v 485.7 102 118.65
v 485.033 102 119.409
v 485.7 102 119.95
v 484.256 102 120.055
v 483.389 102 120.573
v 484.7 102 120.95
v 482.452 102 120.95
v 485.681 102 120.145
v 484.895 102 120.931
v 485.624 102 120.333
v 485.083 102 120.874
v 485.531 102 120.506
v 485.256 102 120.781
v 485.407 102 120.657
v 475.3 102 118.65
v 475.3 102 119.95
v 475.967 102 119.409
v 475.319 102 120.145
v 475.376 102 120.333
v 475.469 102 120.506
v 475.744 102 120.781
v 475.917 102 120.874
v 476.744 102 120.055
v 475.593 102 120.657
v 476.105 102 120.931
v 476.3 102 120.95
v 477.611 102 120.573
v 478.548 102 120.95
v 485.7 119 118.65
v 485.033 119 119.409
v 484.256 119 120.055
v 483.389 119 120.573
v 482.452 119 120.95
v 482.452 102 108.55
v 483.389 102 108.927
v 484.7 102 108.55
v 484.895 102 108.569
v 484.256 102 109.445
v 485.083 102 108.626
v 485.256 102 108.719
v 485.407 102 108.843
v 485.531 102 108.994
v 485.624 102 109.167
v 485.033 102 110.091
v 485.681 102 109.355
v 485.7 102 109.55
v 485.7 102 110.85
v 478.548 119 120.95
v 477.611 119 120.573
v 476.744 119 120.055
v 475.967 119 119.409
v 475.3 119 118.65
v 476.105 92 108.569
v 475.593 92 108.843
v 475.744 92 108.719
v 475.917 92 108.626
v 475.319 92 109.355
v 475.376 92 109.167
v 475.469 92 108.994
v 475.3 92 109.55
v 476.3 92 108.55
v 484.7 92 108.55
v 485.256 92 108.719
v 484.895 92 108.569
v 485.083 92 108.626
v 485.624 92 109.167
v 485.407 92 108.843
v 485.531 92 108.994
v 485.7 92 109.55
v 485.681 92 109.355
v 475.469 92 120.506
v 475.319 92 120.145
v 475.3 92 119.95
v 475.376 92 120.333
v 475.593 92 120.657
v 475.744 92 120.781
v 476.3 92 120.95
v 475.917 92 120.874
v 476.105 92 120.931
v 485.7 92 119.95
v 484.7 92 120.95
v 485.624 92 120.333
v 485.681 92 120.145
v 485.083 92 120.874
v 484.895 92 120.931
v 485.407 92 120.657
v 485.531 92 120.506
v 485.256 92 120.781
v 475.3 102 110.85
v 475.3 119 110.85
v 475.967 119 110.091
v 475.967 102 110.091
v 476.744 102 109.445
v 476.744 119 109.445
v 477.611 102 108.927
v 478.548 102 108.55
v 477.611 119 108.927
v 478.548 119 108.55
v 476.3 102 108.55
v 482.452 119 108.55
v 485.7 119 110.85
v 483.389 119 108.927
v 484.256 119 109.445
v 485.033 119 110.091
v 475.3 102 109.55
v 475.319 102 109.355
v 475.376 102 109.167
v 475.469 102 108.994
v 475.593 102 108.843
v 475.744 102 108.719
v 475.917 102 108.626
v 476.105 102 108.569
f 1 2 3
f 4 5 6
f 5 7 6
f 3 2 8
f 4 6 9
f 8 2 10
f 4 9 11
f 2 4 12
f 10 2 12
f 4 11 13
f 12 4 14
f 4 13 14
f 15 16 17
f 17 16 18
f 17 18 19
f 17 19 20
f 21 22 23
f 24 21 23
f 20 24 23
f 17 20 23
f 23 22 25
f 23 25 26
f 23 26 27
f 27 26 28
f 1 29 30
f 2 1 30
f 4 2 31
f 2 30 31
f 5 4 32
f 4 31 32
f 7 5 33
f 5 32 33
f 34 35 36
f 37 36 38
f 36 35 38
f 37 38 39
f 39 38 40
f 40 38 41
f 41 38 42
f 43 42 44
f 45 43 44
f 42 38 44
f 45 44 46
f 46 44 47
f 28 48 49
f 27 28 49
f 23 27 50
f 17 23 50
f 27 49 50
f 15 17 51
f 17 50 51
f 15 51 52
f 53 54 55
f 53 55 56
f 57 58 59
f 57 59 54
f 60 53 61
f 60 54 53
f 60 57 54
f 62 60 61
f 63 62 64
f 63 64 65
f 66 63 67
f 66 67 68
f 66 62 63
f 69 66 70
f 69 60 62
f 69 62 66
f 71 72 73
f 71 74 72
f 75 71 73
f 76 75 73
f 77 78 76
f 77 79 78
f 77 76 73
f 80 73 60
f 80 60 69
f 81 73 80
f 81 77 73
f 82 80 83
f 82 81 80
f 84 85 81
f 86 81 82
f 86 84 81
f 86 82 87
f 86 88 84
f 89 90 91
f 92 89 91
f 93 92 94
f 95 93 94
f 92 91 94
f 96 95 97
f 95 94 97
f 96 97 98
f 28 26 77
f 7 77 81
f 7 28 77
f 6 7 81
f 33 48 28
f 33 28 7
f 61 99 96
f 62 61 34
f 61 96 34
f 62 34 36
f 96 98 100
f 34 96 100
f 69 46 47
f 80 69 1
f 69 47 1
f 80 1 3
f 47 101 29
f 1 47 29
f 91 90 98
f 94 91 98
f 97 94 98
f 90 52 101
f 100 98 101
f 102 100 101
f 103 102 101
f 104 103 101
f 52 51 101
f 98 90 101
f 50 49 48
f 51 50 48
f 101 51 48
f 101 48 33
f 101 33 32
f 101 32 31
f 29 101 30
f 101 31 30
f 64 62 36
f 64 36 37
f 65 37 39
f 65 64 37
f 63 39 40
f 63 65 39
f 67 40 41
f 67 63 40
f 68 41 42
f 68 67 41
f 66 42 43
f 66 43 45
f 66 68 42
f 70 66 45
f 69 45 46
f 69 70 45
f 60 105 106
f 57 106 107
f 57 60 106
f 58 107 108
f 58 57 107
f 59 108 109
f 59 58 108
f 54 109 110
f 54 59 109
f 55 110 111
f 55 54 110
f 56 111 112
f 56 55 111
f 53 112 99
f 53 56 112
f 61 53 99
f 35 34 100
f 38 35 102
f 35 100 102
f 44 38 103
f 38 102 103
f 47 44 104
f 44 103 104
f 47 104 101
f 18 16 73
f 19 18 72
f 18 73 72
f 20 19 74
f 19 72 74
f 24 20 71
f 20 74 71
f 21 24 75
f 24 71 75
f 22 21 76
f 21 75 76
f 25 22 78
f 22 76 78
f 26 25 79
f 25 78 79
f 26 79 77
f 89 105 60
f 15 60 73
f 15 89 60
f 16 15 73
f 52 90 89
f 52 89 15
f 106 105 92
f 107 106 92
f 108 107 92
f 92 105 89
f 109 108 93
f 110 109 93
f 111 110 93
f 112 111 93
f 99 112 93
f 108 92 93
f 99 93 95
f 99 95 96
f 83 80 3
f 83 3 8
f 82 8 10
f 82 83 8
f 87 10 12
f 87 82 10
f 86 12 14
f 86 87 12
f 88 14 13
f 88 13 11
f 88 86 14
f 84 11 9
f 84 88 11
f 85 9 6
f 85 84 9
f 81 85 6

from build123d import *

# Parameters (mm, degrees)
BOX502_W                  = 10.4
BOX502_H                  = 12.4
BOX502_DEPTH              = 27
FILLET396_R               = 1
CYLINDER1193_R            = 8
CYLINDER1193_DEPTH        = 27
CYLINDER1195_R            = 6.5
CYLINDER1195_DEPTH        = 17
CYLINDER1194_R            = 8
CYLINDER1194_DEPTH        = 17
CYLINDER1196_R            = 8
CYLINDER1196_DEPTH        = 27
CUT014244_PLACEMENT_ANGLE = 90


with BuildPart() as fillet396:
    # Box502 → Box502 (new body)
    with BuildSketch(Plane(origin=(-5.2, -6.2, 0), x_dir=(1, 0, 0), z_dir=(0, 0, 1))):
        with Locations((5.2, 6.2)):
            Rectangle(BOX502_W, BOX502_H)
    extrude(amount=BOX502_DEPTH)

    # Fillet396
    fillet396_edges = [fillet396.edges().sort_by_distance(p)[0] for p in [
        (-5.2, -6.2, 13.5),
        (-5.2, 6.2, 13.5),
        (5.2, -6.2, 13.5),
        (5.2, 6.2, 13.5),
    ]]
    fillet(fillet396_edges, radius=FILLET396_R)


with BuildPart() as cut014243:
    # Cylinder1193 → Cylinder1193 (new body)
    with BuildSketch(Plane.XY):
        Circle(CYLINDER1193_R)
    extrude(amount=CYLINDER1193_DEPTH)

    # Cut014243: cut Fillet396
    add(fillet396.part, mode=Mode.SUBTRACT)


with BuildPart() as cylinder1413:
    # Cylinder1195 → Cylinder1195 (new body)
    with BuildSketch(Plane.XY):
        Circle(CYLINDER1195_R)
    extrude(amount=CYLINDER1195_DEPTH)


with BuildPart() as fusion248002050122:
    # Cylinder1194 → Cylinder1194 (new body)
    with BuildSketch(Plane.XY):
        Circle(CYLINDER1194_R)
    extrude(amount=CYLINDER1194_DEPTH)

    # Cut014242: cut Cylinder1413
    add(cylinder1413.part, mode=Mode.SUBTRACT)

    # Fusion248002050122: union Cut014243
    add(cut014243.part)


with BuildPart() as bucket_turning_motor:
    # Cylinder1196 → Cylinder1196 (new body)
    with BuildSketch(Plane.XY):
        Circle(CYLINDER1196_R)
    extrude(amount=CYLINDER1196_DEPTH)

    # Cut014244: cut Fusion248002050122
    add(fusion248002050122.part, mode=Mode.SUBTRACT)


with BuildPart() as bucket_turning_motor_1:
    # Cut014244 placement: moved
    add(bucket_turning_motor.part.moved(Location((480.5, 119, 114.75))).rotate(Axis((480.5, 119, 114.75), (1, 0, 0)), CUT014244_PLACEMENT_ANGLE))


solid = bucket_turning_motor_1.part
